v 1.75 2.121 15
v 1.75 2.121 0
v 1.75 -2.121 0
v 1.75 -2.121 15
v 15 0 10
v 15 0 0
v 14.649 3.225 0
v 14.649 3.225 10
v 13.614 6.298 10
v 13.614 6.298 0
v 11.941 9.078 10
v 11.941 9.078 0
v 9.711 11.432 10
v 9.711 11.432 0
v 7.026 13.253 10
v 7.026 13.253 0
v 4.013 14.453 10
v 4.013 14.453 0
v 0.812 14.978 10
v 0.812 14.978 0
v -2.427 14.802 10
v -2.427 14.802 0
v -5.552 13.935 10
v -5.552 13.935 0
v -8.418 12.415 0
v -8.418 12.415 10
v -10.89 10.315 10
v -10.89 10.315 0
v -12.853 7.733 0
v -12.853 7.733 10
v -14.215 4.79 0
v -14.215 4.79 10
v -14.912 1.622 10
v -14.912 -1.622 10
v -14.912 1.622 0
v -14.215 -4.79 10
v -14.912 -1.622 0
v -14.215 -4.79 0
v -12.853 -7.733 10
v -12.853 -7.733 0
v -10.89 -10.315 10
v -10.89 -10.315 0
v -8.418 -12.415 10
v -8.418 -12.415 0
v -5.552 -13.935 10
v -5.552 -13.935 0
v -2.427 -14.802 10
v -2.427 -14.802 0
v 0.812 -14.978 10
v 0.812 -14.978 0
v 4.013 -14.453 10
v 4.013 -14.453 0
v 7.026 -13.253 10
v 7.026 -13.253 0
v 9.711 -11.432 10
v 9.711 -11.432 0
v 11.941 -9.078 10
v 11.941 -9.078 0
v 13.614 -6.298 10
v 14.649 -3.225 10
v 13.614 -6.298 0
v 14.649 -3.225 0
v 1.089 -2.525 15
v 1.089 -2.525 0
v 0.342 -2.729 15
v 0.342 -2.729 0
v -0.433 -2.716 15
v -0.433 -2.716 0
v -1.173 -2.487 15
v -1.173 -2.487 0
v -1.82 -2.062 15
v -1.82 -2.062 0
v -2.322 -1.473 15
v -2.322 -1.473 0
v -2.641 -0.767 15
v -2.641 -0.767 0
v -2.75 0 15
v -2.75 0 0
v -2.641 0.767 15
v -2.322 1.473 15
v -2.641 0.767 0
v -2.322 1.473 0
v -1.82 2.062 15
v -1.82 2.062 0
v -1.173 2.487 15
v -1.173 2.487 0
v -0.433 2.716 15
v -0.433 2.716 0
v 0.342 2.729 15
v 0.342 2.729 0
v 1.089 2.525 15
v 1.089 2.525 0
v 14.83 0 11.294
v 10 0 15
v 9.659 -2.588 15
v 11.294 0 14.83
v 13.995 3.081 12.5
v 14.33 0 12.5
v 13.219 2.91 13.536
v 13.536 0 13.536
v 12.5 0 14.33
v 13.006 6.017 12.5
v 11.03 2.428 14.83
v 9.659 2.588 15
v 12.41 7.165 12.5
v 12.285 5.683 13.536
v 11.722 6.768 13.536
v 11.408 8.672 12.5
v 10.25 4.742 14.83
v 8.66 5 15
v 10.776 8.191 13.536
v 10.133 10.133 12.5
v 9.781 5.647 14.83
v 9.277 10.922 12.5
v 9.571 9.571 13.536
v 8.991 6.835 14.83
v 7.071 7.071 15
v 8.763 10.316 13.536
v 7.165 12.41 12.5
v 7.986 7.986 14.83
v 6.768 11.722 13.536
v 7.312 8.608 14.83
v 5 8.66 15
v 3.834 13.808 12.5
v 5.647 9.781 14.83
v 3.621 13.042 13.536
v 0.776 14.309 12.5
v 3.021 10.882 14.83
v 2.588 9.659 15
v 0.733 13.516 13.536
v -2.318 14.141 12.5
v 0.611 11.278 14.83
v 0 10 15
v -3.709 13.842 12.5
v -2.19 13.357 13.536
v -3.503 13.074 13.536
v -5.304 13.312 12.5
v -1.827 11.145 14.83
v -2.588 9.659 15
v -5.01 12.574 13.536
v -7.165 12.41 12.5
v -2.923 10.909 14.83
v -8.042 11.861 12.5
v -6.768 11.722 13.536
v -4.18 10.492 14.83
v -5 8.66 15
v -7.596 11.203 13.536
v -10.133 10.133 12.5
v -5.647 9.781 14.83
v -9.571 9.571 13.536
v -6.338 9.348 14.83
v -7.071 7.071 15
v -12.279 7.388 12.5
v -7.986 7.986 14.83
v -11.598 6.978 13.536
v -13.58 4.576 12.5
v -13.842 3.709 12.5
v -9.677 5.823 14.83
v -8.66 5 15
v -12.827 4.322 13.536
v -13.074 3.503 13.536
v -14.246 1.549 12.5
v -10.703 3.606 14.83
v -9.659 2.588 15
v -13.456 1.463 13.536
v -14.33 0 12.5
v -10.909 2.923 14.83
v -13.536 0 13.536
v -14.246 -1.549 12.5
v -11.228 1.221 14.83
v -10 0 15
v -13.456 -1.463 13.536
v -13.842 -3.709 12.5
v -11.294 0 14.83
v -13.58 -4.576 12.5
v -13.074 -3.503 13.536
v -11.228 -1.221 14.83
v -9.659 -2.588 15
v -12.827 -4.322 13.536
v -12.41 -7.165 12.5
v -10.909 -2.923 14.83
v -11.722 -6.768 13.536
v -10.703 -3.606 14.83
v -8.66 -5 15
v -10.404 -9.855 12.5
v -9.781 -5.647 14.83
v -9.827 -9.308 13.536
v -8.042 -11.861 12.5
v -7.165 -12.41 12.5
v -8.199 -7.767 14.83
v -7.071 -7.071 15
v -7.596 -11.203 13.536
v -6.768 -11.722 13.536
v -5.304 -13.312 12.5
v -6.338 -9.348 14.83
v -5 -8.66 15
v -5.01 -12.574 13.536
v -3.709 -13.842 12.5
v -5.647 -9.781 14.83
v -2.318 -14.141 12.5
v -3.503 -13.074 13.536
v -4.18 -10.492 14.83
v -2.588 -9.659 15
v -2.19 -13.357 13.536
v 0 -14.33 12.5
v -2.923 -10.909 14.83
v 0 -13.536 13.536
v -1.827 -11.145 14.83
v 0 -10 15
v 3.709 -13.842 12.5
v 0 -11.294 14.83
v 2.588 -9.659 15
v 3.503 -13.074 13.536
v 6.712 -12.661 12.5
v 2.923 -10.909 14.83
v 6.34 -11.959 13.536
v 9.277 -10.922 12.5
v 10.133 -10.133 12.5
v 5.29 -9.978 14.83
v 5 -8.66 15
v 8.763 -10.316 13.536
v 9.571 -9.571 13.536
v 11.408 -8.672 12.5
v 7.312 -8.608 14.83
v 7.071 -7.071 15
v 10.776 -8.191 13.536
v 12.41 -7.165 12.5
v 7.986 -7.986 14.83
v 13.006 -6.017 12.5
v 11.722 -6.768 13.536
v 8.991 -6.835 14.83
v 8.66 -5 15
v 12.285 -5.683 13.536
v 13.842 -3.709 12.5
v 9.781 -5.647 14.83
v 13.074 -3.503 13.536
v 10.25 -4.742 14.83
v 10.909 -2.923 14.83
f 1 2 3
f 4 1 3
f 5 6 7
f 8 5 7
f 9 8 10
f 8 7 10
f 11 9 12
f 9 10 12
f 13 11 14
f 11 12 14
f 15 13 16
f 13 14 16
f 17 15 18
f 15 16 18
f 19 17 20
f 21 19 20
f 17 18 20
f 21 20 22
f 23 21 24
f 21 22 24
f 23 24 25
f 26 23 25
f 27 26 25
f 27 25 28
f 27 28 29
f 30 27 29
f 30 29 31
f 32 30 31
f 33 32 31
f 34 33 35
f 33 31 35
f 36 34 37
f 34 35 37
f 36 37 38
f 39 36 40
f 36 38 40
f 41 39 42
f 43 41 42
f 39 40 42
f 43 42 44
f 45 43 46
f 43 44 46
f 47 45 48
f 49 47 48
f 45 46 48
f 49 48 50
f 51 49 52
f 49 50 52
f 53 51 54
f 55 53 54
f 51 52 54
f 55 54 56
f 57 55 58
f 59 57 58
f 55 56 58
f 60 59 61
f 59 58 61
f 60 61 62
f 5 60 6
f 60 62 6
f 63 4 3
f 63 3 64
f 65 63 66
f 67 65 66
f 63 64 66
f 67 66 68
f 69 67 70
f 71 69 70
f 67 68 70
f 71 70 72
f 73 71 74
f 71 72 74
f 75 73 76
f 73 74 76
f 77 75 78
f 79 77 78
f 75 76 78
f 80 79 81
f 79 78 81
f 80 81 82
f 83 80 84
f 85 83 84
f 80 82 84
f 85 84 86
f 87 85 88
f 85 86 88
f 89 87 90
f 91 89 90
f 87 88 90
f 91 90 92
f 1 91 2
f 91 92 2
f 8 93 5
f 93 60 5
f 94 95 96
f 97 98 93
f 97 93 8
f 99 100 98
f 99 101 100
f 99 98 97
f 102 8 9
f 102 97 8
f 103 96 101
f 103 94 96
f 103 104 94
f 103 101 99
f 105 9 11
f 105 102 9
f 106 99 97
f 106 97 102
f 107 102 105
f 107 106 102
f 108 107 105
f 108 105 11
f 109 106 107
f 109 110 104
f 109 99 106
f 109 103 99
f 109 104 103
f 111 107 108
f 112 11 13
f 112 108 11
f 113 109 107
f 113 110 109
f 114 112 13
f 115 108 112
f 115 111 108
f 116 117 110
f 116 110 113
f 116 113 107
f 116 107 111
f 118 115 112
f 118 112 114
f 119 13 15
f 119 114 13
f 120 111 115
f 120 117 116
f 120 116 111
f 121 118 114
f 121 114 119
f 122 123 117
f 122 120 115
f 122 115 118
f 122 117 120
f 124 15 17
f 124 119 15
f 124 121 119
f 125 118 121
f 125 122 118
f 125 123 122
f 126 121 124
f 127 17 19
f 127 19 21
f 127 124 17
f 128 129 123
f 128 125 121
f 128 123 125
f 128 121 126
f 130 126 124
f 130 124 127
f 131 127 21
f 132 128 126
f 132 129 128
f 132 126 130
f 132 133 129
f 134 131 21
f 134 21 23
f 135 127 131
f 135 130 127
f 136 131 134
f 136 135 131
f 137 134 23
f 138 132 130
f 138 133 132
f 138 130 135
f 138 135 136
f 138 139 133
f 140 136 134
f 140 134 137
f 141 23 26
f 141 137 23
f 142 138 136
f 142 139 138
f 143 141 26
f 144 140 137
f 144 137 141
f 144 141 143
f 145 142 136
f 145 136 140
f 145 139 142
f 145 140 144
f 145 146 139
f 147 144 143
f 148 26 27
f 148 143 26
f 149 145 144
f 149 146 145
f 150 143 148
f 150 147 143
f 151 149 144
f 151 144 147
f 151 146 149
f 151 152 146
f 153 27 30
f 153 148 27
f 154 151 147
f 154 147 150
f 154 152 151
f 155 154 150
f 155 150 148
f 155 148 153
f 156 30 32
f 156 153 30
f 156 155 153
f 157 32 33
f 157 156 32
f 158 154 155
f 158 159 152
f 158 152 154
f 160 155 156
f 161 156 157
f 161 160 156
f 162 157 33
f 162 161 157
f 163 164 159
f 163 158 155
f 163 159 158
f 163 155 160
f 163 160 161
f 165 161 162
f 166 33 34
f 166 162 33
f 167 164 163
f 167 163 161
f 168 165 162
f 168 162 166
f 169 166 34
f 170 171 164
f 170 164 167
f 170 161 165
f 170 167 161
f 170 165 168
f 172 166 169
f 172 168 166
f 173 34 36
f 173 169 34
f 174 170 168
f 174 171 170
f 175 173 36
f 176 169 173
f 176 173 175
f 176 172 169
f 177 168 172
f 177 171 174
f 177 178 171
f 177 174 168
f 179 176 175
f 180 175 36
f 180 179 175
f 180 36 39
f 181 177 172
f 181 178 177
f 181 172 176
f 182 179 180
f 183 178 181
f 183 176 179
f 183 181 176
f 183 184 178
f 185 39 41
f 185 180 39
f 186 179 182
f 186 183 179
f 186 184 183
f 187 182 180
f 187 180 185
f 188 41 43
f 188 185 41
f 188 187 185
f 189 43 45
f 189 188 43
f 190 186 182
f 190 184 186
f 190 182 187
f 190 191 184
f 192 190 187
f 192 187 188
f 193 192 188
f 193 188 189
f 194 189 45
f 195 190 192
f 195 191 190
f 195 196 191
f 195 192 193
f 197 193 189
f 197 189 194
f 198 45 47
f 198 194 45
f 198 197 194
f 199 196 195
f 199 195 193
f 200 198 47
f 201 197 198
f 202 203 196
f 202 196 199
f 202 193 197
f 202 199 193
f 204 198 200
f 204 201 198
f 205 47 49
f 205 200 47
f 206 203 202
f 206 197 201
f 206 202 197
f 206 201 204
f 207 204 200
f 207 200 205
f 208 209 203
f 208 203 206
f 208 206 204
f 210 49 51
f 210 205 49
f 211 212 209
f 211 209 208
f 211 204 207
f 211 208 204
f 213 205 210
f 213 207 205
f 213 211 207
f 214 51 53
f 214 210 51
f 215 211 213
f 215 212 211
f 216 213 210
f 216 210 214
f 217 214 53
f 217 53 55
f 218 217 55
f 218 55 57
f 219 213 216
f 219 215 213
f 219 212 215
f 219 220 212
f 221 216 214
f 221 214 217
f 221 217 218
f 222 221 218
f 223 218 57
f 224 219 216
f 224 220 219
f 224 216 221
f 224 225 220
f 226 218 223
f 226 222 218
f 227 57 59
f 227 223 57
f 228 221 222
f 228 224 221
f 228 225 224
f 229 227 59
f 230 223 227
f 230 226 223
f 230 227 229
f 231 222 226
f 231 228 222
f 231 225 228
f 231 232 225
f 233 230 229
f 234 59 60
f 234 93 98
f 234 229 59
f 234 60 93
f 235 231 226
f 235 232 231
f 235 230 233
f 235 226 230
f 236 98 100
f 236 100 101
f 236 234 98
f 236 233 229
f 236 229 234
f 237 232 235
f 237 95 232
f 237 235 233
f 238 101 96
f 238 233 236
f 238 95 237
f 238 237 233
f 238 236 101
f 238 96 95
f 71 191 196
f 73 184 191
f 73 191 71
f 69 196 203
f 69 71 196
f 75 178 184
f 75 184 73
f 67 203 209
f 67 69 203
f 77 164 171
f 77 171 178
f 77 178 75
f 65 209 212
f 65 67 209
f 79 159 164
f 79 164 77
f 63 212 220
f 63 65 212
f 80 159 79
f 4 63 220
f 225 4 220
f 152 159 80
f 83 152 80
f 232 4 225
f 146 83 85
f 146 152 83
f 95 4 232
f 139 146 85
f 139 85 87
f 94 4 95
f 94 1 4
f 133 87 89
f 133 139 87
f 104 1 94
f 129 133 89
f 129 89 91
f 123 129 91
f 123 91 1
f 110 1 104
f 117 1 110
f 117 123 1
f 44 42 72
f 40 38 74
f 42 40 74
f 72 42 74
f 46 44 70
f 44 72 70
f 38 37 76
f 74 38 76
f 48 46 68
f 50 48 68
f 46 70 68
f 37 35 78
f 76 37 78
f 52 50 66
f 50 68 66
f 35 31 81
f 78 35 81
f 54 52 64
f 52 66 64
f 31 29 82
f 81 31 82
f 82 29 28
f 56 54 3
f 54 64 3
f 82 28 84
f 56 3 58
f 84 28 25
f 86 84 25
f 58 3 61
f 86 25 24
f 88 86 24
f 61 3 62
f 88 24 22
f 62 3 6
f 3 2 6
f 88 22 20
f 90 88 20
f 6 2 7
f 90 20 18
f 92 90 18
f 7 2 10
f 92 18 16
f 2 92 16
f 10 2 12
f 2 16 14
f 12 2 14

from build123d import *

# Parameters (mm, degrees)
F0_R     = 15
F1_DEPTH = 15
F3_DEPTH = 25
F4_R     = 5


with BuildPart() as f1:
    # F0 (on Top) → F1 (new body)
    with BuildSketch(Plane.XY):
        Circle(F0_R)
    extrude(amount=F1_DEPTH)

    # F2 (on face) → F3 (cut)
    with BuildSketch(Plane(origin=(0, 0, 0), x_dir=(1, 0, 0), z_dir=(0, 0, -1))):
        with BuildLine():
            Line((1.75, -2.12132), (1.75, 2.12132))
            ThreePointArc((1.75, 2.12132), (-2.75, 0), (1.75, -2.12132))
        make_face()
    extrude(amount=-F3_DEPTH, mode=Mode.SUBTRACT)

    # F4
    f4_edges = [f1.edges().sort_by_distance(p)[0] for p in [
        (-15, 0, 15),
    ]]
    fillet(f4_edges, radius=F4_R)


solid = f1.part
